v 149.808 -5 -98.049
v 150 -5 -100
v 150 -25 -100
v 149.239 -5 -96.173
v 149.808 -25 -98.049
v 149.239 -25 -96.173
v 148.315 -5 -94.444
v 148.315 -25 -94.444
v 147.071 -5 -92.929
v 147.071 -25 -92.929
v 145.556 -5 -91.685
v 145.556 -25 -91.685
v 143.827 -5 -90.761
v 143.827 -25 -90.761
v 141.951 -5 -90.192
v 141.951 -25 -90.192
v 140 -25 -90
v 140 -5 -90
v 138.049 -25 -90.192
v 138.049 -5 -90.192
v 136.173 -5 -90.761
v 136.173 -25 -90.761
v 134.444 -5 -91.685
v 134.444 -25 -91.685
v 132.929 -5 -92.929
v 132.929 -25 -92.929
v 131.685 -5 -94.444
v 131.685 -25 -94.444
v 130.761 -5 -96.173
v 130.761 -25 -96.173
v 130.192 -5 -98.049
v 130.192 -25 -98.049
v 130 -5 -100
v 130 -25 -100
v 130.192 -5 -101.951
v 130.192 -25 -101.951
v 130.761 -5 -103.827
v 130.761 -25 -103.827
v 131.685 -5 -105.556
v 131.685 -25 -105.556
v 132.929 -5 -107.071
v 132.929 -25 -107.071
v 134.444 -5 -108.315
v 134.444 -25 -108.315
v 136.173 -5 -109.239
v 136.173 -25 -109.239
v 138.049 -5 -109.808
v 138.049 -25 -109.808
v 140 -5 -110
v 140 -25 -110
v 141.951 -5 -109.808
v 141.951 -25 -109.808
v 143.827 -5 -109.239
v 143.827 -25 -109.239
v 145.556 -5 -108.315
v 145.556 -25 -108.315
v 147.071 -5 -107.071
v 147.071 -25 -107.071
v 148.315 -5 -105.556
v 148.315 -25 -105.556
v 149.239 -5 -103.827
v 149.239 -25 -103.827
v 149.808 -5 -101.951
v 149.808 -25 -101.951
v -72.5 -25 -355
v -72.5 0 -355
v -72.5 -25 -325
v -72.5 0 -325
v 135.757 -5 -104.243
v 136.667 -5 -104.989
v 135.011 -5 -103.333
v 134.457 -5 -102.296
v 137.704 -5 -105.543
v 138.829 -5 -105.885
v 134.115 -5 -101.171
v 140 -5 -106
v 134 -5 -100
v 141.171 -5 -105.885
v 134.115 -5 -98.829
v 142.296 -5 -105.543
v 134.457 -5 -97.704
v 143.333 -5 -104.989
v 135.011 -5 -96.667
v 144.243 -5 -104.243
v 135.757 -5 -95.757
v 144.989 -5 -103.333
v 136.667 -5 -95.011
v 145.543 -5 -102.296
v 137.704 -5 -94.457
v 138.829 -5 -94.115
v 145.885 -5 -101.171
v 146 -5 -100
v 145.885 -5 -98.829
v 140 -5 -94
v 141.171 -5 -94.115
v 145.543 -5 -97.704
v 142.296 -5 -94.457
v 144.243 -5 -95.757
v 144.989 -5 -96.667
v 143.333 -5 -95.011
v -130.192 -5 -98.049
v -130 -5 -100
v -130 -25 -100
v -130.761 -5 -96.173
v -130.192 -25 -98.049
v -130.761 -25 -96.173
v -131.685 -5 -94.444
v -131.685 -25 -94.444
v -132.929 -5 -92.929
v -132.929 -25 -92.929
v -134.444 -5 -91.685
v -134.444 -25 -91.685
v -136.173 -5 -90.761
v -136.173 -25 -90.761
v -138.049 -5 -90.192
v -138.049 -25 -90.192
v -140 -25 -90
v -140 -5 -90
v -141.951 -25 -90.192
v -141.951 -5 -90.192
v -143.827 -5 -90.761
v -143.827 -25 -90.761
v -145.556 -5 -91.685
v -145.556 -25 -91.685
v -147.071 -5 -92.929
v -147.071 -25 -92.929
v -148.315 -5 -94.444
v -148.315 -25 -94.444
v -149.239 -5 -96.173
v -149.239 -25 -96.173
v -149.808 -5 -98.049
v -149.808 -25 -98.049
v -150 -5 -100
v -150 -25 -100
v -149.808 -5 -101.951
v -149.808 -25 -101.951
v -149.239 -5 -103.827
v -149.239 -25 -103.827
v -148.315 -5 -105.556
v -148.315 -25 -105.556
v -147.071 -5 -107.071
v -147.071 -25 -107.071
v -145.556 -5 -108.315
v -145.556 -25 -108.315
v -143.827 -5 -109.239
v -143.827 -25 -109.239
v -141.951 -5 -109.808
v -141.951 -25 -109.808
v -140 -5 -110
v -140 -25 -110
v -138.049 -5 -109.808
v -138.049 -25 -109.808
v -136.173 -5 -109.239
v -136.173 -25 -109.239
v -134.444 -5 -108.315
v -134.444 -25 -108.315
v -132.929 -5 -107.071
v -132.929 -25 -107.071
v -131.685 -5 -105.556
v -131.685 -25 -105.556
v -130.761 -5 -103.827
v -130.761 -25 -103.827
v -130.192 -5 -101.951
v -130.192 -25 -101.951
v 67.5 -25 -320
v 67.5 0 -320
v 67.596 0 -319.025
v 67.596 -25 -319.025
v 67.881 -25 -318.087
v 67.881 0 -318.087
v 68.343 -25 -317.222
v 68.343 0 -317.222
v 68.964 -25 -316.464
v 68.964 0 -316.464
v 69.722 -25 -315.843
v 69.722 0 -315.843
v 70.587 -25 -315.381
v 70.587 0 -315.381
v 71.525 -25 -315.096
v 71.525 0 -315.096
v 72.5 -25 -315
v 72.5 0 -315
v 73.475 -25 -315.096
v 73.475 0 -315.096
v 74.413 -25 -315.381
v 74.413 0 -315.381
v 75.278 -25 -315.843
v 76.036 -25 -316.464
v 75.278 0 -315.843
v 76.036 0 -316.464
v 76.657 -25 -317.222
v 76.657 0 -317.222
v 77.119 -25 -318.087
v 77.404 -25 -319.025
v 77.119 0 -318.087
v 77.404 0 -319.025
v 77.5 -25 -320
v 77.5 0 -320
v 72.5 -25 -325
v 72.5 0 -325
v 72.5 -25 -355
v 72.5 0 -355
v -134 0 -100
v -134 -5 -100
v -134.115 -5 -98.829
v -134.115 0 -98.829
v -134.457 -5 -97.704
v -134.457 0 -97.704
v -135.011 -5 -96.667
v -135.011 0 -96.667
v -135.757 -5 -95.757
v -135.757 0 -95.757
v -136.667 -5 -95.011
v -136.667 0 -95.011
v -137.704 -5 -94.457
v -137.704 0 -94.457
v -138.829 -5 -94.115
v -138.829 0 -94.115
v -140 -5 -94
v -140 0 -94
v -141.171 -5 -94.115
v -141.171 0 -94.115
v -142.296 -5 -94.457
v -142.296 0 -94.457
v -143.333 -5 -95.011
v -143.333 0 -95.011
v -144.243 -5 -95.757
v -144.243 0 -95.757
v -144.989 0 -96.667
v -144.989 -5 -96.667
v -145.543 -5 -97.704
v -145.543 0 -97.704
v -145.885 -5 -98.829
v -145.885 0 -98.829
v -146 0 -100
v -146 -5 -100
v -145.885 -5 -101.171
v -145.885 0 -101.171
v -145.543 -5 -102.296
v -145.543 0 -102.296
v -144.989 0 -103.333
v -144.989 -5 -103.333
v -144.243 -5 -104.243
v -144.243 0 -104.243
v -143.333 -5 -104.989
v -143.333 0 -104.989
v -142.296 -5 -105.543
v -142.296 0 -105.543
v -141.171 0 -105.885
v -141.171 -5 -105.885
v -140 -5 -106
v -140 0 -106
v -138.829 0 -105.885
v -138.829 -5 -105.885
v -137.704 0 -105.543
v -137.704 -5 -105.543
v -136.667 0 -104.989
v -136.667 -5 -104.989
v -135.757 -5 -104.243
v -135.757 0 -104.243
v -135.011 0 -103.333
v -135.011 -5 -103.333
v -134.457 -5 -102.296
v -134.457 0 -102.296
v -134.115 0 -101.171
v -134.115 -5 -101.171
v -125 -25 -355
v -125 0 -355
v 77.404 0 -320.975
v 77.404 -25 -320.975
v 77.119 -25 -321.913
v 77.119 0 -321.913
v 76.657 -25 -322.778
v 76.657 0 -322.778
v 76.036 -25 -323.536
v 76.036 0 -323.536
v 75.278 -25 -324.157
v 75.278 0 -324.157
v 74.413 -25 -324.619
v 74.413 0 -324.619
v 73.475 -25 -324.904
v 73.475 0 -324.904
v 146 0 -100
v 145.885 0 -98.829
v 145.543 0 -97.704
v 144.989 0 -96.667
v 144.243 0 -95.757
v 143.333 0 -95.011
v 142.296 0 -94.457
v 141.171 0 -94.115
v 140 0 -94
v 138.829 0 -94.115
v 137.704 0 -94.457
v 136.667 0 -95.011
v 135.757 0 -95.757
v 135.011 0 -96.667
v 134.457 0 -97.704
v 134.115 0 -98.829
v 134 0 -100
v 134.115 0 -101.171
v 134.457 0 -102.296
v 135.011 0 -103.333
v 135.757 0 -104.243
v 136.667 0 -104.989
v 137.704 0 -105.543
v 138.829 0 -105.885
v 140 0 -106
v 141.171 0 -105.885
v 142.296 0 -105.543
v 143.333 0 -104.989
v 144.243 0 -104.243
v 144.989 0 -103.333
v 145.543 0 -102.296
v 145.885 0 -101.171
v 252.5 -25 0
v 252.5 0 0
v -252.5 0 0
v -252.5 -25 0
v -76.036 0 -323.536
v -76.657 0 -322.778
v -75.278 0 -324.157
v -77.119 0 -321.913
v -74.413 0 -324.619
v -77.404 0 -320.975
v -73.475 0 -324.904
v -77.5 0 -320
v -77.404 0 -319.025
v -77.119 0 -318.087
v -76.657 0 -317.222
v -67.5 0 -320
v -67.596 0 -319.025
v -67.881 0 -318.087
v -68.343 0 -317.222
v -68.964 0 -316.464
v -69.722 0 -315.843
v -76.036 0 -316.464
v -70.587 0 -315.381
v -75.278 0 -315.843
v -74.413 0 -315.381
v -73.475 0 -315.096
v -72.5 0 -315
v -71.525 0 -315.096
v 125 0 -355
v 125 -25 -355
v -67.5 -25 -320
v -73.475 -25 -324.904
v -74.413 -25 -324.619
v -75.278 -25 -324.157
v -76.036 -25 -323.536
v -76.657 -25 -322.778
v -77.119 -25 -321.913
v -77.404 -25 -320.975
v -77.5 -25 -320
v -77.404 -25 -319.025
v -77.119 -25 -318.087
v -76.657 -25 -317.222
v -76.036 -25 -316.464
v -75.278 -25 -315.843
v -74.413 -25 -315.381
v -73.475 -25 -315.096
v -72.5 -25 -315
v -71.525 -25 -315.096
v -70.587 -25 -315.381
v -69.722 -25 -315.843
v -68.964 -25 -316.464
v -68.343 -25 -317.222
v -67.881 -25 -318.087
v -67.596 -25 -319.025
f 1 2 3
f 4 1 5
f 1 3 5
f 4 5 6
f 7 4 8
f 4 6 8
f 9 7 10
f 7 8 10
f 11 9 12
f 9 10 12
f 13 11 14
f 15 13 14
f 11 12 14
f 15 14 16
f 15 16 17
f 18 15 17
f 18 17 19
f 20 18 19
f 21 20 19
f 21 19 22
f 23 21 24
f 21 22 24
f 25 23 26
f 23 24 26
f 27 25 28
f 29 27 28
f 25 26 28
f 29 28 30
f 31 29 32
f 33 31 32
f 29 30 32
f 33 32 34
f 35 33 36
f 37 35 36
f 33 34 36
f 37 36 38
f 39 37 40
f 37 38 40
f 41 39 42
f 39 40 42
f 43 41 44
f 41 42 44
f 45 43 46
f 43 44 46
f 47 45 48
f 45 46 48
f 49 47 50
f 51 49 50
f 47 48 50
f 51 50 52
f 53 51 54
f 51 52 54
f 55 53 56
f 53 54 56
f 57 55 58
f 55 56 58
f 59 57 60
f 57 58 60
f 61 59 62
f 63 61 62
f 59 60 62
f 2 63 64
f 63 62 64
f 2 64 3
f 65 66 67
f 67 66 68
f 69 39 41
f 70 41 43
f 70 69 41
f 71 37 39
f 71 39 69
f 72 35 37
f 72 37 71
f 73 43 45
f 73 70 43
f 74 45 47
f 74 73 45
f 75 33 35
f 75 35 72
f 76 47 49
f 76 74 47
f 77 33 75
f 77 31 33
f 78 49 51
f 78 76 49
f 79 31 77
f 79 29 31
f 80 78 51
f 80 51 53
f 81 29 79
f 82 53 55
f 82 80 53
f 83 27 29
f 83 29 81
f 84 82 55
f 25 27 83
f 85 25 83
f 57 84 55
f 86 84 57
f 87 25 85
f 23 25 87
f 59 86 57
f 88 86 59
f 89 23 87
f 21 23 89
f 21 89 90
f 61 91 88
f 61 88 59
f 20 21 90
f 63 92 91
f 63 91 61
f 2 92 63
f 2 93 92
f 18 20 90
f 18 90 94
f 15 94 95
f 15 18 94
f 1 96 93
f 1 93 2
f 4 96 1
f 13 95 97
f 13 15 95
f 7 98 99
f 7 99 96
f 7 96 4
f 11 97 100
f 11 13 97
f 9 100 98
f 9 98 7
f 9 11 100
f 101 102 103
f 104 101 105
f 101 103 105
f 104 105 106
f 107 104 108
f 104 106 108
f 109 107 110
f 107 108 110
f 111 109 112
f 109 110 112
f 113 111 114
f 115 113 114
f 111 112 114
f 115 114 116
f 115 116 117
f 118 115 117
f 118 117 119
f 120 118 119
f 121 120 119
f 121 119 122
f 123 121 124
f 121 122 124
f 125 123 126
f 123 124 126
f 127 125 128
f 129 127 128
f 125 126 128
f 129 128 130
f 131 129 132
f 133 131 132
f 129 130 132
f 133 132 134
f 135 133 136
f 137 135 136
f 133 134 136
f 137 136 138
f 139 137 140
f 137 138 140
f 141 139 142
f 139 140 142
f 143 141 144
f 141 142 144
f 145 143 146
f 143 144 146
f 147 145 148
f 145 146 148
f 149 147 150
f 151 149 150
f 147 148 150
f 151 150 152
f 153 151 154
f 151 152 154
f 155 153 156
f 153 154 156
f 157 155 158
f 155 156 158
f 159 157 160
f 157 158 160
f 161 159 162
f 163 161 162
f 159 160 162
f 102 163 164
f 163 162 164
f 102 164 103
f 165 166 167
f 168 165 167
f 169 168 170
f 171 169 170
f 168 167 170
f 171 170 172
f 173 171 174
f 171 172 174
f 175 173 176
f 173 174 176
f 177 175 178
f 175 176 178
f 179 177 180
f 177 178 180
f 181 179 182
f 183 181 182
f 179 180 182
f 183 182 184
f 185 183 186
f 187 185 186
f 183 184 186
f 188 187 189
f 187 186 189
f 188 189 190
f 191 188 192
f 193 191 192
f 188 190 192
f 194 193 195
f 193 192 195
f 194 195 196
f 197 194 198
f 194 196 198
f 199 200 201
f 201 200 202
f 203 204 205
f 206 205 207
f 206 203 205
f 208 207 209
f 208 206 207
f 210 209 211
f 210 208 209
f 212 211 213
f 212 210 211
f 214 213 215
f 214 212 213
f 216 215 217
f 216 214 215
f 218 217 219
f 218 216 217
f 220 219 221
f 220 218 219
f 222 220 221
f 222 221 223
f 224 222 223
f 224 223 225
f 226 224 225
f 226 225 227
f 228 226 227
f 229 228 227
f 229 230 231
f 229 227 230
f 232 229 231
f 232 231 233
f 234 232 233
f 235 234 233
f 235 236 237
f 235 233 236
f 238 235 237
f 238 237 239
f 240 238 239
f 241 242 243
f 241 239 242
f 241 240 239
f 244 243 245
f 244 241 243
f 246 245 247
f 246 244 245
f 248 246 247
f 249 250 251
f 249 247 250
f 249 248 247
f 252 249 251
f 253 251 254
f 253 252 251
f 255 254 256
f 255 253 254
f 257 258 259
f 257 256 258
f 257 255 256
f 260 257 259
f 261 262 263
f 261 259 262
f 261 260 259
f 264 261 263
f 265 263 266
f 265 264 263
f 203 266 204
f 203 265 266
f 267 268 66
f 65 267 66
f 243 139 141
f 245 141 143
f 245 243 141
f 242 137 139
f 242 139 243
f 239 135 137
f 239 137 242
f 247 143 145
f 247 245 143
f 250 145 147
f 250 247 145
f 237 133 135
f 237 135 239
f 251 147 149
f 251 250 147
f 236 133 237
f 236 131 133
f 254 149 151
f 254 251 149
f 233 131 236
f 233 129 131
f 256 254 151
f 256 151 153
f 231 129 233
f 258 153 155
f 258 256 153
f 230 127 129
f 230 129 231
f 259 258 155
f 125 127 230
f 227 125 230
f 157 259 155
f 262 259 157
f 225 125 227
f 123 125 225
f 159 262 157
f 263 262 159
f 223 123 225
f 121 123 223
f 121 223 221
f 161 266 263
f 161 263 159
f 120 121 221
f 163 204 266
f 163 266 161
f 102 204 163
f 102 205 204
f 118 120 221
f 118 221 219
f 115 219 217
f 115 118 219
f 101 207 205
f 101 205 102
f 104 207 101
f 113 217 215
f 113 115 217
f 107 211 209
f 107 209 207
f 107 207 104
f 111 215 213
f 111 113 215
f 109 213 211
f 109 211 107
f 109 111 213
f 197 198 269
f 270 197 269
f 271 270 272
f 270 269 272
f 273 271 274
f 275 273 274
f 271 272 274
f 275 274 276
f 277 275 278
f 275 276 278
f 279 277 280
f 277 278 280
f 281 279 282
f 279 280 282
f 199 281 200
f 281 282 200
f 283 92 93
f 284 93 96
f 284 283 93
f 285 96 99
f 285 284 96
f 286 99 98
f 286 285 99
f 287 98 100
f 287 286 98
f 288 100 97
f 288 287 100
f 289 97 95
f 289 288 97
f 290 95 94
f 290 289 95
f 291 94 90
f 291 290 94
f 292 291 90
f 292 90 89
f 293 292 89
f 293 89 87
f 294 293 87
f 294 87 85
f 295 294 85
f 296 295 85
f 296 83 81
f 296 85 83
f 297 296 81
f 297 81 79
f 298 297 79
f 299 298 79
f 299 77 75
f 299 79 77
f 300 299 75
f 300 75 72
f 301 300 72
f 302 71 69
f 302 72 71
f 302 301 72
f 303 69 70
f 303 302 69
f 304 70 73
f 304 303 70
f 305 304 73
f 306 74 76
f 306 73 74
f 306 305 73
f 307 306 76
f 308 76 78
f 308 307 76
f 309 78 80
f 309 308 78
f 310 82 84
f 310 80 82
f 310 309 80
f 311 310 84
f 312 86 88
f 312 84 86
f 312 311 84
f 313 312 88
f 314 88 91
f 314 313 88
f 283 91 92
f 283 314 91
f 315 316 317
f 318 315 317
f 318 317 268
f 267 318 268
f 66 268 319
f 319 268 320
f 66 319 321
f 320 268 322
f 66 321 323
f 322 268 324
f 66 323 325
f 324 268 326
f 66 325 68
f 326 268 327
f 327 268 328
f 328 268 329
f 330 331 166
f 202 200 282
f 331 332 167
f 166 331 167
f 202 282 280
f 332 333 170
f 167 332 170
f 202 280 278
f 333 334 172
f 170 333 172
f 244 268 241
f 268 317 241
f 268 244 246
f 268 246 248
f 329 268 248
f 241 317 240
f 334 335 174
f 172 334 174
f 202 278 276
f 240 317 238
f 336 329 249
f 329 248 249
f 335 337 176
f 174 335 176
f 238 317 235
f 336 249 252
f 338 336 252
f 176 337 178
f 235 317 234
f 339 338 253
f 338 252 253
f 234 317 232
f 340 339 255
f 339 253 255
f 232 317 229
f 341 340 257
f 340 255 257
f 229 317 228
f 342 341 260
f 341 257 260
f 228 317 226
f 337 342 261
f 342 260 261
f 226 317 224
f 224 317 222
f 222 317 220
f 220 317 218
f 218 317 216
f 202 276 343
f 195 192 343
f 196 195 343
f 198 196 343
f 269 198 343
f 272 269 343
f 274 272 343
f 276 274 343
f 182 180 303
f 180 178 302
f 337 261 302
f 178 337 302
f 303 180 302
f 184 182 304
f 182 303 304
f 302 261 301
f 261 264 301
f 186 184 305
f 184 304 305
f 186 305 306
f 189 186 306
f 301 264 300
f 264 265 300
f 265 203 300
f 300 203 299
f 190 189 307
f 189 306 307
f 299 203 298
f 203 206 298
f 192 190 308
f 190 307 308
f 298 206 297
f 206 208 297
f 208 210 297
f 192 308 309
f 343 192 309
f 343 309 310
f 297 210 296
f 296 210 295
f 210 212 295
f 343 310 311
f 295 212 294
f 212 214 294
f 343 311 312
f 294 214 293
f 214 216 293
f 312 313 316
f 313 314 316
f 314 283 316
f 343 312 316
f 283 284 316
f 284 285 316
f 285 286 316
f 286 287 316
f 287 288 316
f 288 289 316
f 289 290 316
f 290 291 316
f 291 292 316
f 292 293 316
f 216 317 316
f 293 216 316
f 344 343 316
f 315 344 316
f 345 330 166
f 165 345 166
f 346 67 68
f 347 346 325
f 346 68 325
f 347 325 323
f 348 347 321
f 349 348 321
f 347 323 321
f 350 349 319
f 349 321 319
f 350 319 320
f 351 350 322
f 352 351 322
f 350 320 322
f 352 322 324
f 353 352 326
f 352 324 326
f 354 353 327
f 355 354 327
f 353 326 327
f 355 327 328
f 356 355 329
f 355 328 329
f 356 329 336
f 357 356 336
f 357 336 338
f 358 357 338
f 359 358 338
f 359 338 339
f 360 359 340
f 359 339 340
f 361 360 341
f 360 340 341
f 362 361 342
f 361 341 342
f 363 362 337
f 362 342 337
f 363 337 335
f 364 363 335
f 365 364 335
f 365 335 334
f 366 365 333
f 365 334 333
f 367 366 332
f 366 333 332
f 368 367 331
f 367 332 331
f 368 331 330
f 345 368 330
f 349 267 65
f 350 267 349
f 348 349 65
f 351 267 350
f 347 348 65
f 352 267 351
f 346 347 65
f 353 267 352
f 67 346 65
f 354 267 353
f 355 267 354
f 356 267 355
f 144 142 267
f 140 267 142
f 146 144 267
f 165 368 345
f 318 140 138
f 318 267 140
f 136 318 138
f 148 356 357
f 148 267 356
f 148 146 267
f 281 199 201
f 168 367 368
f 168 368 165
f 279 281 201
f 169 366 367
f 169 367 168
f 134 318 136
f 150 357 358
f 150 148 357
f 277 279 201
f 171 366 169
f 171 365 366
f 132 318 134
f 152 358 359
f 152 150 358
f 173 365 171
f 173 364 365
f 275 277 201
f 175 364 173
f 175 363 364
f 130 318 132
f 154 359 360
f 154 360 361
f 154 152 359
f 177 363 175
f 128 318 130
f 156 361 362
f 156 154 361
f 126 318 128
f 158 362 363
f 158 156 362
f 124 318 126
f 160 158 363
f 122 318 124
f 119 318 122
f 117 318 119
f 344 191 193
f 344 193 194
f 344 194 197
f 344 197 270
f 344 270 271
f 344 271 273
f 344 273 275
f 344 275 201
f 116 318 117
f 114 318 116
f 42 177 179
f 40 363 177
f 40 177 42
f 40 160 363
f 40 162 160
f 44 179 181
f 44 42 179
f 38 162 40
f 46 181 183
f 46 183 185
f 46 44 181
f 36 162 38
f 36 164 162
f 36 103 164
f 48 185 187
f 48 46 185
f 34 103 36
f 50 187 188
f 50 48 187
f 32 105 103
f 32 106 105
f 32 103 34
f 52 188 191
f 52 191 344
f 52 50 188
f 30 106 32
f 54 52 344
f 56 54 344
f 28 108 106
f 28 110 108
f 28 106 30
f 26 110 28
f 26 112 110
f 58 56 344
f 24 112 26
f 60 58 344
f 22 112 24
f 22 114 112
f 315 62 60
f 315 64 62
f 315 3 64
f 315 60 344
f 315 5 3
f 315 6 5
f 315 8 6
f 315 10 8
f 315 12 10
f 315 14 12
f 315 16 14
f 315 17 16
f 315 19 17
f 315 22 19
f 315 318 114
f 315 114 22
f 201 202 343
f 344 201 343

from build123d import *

# Parameters (mm, degrees)
F0_R     = 6
F1_DEPTH = 25
F2_R     = 10
F3_DEPTH = 20


with BuildPart() as f1:
    # F0 (on Front) → F1 (new body)
    with BuildSketch(Plane.XZ):
        with BuildLine():
            Line((-125, -355), (-72.5, -355))
            Line((-72.5, -355), (-72.5, -325))
            ThreePointArc((-72.5, -325), (-76.035534, -316.464466), (-67.5, -320))
            Line((-67.5, -320), (67.5, -320))
            ThreePointArc((67.5, -320), (72.5, -315), (77.5, -320))
            ThreePointArc((77.5, -320), (76.035534, -323.535534), (72.5, -325))
            Line((72.5, -325), (72.5, -355))
            Line((72.5, -355), (125, -355))
            Line((125, -355), (252.5, 0))
            Line((252.5, 0), (0, 0))
            Line((0, 0), (-252.5, 0))
            Line((-252.5, 0), (-125, -355))
        make_face()
        with Locations((-140, -100)):
            Circle(F0_R, mode=Mode.SUBTRACT)
        with Locations((140, -100)):
            Circle(F0_R, mode=Mode.SUBTRACT)
    extrude(amount=F1_DEPTH)

    # F2 (on face) → F3 (cut)
    with BuildSketch(Plane.XZ.offset(25)):
        with Locations((-140, -100)):
            Circle(F2_R)
        with Locations((140, -100)):
            Circle(F2_R)
    extrude(amount=-F3_DEPTH, mode=Mode.SUBTRACT)


solid = f1.part
